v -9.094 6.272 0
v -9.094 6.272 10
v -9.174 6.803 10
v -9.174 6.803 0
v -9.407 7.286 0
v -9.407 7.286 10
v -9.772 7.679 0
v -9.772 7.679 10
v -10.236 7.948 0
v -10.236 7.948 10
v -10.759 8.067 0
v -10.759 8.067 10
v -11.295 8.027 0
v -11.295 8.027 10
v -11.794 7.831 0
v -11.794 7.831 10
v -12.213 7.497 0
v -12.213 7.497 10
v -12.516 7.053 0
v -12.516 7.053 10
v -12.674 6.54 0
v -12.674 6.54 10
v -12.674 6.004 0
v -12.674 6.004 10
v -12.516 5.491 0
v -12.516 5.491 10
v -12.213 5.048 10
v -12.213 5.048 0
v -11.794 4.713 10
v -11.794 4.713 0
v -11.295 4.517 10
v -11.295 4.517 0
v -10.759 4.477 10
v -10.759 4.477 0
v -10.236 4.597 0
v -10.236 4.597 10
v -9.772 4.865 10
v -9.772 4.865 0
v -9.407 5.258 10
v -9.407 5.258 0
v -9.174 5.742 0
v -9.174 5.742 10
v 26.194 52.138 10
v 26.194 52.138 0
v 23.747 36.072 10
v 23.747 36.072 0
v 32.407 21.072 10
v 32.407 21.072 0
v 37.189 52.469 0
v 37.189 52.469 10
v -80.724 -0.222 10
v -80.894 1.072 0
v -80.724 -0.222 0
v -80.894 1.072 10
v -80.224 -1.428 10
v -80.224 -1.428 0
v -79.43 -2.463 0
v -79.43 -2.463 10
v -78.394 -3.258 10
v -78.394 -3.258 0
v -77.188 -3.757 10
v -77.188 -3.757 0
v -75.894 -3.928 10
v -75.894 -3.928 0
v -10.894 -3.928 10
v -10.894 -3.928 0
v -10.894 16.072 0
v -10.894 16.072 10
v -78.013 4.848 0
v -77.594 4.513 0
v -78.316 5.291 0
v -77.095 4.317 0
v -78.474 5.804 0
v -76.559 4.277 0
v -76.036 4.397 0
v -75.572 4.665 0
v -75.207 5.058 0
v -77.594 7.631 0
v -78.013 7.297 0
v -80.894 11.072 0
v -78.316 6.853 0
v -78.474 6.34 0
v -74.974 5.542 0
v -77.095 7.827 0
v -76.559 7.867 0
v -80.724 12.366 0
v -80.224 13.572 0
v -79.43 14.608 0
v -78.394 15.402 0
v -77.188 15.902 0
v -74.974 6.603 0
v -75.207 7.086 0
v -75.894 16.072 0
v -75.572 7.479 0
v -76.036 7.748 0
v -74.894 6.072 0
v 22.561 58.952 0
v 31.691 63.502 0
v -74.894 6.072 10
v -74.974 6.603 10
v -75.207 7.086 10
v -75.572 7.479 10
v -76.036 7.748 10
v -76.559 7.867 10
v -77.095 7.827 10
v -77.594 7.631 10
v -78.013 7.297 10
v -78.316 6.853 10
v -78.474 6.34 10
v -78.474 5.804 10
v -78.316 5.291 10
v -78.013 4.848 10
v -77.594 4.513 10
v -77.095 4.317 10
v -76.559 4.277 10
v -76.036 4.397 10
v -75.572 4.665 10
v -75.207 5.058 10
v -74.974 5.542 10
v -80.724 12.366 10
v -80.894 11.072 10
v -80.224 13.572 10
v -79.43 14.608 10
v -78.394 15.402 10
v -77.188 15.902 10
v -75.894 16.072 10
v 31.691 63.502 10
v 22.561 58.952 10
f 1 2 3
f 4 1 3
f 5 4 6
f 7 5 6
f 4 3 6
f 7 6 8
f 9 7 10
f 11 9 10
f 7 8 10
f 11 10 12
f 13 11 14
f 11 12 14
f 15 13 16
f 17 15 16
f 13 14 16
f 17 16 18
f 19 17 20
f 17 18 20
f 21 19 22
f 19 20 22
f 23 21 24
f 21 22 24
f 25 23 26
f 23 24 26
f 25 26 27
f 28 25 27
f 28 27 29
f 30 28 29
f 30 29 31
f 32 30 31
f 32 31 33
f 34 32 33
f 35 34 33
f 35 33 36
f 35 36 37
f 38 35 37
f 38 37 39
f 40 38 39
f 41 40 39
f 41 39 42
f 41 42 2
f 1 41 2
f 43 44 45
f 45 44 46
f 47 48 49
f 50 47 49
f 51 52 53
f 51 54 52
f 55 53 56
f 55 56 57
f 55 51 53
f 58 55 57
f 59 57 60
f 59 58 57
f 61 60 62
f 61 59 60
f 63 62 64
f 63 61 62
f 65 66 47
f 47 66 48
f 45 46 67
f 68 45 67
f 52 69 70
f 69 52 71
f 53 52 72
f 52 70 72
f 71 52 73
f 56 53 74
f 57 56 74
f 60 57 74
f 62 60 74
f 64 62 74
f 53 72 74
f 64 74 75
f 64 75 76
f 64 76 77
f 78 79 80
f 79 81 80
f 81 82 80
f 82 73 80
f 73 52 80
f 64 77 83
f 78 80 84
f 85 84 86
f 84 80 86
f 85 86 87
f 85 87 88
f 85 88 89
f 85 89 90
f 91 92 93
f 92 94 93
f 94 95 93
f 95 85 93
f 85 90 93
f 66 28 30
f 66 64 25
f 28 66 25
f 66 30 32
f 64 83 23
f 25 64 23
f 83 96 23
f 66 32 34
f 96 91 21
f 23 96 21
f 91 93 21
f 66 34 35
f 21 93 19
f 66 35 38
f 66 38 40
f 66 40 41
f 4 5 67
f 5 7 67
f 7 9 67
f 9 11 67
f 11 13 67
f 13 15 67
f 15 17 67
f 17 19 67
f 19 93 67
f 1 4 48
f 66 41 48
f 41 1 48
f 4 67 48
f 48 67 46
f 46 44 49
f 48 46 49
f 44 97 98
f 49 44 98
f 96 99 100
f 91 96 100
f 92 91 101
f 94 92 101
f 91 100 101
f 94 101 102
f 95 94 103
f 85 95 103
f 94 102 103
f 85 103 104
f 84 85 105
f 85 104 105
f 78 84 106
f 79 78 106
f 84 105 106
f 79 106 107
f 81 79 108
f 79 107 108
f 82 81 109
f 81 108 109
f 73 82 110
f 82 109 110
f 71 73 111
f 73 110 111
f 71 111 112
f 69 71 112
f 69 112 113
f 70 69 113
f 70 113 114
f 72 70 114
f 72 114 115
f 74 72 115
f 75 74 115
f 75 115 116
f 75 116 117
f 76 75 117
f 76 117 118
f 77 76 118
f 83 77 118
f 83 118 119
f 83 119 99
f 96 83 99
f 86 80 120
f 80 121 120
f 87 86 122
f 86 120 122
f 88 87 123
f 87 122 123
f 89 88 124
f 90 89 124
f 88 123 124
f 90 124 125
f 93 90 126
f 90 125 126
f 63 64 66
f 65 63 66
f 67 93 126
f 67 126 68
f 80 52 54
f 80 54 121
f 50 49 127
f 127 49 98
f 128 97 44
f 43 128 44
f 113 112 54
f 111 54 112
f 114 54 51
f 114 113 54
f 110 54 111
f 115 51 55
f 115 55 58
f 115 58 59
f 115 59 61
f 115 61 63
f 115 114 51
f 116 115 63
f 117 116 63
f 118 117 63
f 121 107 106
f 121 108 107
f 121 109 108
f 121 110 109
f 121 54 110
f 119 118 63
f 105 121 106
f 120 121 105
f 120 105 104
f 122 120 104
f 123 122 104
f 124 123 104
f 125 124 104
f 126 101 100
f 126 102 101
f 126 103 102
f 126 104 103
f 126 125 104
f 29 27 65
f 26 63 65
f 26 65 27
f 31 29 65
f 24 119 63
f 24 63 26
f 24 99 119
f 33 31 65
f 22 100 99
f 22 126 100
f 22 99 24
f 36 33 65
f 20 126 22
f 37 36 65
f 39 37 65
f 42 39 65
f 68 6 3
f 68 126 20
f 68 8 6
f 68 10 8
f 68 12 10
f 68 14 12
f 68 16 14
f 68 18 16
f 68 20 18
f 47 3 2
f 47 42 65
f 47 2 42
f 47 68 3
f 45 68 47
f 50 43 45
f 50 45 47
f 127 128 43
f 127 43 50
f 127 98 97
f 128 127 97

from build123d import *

# Parameters (mm, degrees)
F0_W     = 70
F0_H     = 20
F1_DEPTH = 10
F2_R     = 5
F3_R     = 1.8
F4_DEPTH = 20
F5_R     = 1.8
F6_DEPTH = 20


with BuildPart() as f1:
    # F0 (on Top) → F1 (new body)
    with BuildSketch(Plane.XY):
        with Locations((-45.893969, 6.072203)):
            Rectangle(F0_W, F0_H)
        Polygon((-10.893969, 16.072203), (-10.893969, -3.927797), (32.407302, 21.072203), (23.747048, 36.072203), align=None)
        Polygon((23.747048, 36.072203), (32.407302, 21.072203), (37.188711, 52.469358), (26.193698, 52.138151), align=None)
        Polygon((26.193698, 52.138151), (37.188711, 52.469358), (31.691205, 63.501806), (22.561267, 58.952328), align=None)
    extrude(amount=F1_DEPTH)

    # F2
    f2_edges = [f1.edges().sort_by_distance(p)[0] for p in [
        (-80.893969, 16.072203, 5),
        (-80.893969, -3.927797, 5),
    ]]
    fillet(f2_edges, radius=F2_R)

    # F3 (on face) → F4 (cut)
    with BuildSketch(Plane.XY.offset(10)):
        with Locations((-76.693969, 6.072203)):
            Circle(F3_R)
    extrude(amount=-F4_DEPTH, mode=Mode.SUBTRACT)

    # F5 (on face) → F6 (cut)
    with BuildSketch(Plane.XY.offset(10)):
        with Locations((-10.893969, 6.272203)):
            Circle(F5_R)
    extrude(amount=-F6_DEPTH, mode=Mode.SUBTRACT)


solid = f1.part
